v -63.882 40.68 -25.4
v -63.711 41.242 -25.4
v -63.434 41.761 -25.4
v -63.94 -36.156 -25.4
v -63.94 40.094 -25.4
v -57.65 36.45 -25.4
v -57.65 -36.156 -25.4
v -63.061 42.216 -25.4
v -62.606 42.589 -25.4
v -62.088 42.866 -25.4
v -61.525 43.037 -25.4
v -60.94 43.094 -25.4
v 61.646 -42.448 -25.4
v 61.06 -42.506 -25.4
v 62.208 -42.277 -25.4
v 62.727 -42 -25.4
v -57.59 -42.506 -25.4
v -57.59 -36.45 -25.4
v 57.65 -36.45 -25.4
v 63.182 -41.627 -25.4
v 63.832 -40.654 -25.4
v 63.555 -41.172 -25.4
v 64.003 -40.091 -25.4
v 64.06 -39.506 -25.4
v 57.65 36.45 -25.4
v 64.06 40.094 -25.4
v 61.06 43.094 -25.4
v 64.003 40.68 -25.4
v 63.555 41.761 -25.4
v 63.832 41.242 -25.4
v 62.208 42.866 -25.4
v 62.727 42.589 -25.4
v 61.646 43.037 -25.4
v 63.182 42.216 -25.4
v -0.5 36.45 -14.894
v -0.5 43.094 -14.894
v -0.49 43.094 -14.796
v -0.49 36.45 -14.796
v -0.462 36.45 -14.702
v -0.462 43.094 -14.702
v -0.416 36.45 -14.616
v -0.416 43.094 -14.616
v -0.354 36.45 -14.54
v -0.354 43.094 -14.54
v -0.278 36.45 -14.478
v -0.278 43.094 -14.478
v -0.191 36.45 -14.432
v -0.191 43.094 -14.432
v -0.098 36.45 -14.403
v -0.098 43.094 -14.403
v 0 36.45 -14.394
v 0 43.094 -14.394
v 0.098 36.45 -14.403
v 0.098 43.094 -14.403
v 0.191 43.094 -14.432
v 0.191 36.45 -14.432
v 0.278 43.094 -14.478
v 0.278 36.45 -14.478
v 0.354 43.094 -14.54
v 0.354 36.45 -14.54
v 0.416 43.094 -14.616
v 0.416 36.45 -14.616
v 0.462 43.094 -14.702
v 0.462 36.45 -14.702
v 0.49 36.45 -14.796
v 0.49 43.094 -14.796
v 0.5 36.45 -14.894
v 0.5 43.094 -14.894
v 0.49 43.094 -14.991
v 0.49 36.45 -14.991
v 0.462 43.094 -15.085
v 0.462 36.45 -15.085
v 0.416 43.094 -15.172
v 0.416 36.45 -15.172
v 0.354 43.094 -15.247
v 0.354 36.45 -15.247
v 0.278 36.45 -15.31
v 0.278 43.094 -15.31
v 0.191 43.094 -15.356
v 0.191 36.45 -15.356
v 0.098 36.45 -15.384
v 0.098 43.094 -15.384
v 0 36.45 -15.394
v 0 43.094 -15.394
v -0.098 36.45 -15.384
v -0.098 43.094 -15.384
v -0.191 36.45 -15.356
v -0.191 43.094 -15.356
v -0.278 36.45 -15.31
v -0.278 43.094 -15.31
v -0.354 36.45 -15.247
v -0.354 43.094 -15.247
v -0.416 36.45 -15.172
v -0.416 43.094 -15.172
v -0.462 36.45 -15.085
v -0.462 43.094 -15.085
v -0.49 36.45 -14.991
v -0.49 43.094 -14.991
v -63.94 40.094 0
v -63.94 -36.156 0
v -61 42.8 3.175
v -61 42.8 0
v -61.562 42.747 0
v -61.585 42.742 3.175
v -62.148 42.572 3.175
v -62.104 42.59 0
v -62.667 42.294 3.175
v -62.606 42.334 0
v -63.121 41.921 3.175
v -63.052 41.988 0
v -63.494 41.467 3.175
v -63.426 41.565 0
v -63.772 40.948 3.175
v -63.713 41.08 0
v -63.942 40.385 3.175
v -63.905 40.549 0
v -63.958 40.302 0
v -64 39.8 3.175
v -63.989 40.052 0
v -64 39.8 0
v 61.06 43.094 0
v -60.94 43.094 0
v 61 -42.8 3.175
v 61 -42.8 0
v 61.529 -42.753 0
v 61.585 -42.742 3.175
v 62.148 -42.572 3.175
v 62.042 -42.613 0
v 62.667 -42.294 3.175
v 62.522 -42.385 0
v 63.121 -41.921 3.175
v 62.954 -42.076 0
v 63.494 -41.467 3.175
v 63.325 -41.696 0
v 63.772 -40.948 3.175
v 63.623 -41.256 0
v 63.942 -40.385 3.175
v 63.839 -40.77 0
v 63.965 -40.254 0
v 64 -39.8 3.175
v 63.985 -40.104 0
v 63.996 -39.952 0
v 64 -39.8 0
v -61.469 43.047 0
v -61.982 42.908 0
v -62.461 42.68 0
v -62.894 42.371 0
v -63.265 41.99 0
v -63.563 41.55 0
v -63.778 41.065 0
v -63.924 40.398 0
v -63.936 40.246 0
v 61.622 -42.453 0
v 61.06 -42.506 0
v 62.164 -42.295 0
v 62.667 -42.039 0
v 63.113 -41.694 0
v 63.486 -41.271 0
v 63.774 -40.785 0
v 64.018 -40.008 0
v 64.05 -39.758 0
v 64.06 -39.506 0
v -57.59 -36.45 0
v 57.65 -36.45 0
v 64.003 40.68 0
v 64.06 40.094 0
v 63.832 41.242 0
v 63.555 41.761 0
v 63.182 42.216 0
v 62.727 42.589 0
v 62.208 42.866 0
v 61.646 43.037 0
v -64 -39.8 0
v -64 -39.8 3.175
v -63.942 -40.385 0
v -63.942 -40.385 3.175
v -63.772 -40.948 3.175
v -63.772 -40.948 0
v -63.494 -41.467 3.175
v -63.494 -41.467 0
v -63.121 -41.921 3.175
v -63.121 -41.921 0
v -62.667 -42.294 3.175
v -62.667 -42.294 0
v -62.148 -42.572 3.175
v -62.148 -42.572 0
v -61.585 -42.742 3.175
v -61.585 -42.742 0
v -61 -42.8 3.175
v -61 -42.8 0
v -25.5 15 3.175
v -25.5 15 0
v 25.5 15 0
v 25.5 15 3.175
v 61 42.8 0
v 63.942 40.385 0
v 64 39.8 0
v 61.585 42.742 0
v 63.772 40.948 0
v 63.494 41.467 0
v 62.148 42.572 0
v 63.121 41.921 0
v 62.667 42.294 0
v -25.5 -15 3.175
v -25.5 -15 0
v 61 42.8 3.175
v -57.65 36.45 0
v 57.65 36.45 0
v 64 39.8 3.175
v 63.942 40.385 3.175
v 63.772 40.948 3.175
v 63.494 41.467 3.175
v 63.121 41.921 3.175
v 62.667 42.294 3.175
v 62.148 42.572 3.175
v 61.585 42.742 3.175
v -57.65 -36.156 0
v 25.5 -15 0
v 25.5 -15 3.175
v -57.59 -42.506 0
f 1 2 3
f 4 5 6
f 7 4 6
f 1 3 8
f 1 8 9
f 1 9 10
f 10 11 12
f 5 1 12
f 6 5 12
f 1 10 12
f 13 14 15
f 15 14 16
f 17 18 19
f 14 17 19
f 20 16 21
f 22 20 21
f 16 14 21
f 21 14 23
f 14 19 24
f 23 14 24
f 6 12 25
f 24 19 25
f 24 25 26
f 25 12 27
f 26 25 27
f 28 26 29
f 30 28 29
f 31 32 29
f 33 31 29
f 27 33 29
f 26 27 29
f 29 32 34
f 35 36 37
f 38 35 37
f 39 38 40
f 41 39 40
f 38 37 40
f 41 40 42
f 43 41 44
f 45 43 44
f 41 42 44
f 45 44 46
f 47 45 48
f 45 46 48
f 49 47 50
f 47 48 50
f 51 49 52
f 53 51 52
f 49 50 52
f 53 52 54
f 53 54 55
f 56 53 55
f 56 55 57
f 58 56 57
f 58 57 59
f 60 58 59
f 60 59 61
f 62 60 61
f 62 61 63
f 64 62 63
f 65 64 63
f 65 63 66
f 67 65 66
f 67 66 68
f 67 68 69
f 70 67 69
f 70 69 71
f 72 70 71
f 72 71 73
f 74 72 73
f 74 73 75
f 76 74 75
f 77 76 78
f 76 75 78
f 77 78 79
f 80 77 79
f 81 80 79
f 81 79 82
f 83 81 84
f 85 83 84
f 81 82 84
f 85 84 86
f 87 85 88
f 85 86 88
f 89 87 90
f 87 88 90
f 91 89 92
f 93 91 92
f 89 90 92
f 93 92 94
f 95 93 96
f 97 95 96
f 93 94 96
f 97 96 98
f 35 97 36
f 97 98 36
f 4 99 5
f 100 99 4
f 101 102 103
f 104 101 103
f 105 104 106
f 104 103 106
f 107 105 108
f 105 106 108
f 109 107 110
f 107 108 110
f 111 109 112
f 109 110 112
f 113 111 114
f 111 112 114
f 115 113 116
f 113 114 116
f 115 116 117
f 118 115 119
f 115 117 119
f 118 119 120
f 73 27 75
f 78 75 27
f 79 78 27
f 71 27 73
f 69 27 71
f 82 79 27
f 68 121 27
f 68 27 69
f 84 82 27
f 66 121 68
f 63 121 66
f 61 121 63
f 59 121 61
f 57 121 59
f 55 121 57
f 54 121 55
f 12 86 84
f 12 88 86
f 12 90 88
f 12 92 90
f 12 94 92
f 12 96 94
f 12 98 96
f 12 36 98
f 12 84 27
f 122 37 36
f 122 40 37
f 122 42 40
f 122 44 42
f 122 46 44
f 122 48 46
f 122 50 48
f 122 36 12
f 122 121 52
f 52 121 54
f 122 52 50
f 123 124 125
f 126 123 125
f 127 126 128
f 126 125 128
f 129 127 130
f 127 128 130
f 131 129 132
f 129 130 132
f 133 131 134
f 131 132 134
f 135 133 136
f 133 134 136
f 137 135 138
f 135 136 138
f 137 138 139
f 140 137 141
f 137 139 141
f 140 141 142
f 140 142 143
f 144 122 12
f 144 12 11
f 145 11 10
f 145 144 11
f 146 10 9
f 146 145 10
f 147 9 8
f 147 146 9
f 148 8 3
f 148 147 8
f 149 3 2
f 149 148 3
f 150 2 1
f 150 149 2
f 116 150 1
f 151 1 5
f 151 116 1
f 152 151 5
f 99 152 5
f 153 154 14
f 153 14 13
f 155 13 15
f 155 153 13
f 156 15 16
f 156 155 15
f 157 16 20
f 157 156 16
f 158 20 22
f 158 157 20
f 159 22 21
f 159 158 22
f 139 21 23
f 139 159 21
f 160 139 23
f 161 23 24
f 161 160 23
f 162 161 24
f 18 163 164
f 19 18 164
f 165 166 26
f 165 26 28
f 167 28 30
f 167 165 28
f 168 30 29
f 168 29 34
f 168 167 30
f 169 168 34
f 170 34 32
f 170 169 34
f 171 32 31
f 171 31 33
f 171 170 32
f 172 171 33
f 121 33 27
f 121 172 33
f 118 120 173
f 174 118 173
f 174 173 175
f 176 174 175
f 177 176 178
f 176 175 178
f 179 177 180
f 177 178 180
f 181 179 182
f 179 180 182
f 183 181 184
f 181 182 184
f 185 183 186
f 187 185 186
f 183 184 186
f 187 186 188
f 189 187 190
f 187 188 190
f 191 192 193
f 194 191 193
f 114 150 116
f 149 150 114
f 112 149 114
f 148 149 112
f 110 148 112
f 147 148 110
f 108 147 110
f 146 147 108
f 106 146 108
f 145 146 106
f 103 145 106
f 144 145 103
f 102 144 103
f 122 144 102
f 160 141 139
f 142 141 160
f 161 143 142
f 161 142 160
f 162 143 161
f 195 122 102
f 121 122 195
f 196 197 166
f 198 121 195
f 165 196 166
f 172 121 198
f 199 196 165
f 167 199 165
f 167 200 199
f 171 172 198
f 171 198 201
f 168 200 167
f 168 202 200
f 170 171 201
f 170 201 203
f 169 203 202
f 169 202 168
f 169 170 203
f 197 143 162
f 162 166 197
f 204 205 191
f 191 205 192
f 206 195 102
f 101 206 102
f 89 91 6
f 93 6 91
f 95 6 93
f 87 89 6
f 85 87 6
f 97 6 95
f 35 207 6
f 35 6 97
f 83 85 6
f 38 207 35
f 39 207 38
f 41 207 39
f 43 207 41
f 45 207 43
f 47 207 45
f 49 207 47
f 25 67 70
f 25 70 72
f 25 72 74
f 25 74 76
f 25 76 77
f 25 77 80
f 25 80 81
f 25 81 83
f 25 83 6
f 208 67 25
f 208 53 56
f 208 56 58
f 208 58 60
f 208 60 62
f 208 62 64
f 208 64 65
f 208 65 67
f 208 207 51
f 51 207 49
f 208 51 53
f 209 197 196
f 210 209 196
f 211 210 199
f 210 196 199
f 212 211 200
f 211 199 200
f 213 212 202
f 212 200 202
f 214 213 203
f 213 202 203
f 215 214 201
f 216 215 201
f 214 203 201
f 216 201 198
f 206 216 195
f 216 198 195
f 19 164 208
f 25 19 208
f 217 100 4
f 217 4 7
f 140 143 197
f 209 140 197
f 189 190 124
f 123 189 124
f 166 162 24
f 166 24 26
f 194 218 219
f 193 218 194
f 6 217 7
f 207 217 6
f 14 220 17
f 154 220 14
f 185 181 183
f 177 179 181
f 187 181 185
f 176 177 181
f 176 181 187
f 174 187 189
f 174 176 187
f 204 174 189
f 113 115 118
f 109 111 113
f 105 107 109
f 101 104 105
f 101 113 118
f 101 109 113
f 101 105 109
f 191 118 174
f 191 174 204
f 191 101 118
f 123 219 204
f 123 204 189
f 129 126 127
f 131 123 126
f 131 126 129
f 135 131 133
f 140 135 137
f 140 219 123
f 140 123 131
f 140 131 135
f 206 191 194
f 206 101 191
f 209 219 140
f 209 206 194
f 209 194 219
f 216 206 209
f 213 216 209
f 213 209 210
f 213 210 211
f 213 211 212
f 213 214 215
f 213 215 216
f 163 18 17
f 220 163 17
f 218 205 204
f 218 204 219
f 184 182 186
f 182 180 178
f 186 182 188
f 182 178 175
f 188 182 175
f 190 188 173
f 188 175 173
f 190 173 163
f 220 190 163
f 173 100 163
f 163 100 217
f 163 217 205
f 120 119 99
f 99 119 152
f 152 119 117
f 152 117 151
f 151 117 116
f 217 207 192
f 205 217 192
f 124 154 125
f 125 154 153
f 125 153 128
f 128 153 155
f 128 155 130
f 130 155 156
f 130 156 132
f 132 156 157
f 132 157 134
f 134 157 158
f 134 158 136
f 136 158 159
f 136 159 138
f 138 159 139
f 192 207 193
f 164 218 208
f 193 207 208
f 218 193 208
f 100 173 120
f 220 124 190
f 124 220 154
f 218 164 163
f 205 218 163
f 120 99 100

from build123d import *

# Parameters (mm, degrees)
F0_W     = 51
F0_H     = 30
F1_DEPTH = 3.175
F2_W     = 115.3
F2_H     = 72.9
F4_DEPTH = 25.4
F3_W     = 115.3
F3_H     = 72.9
F5_DEPTH = 25.4
F6_R     = 0.5
F7_DEPTH = 25


with BuildPart() as f1:
    # F0 (on Top) → F1 (new body)
    with BuildSketch(Plane.XY):
        with BuildLine():
            Line((61, 42.8), (-61, 42.8))
            ThreePointArc((-61, 42.8), (-63.1213203436, 41.9213203436), (-64, 39.8))
            Line((-64, 39.8), (-64, -39.8))
            ThreePointArc((-64, -39.8), (-63.1213203436, -41.9213203436), (-61, -42.8))
            Line((-61, -42.8), (61, -42.8))
            ThreePointArc((61, -42.8), (63.1213203436, -41.9213203436), (64, -39.8))
            Line((64, -39.8), (64, 39.8))
            ThreePointArc((64, 39.8), (63.1213203436, 41.9213203436), (61, 42.8))
        make_face()
        Rectangle(F0_W, F0_H, mode=Mode.SUBTRACT)
    extrude(amount=F1_DEPTH)

    # F2 (on Top) → F4 (join)
    with BuildSketch(Plane.XY):
        with BuildLine():
            Line((-63.9396576047, -36.1556038049), (-57.5896576047, -36.1556038049))
            Line((-57.5896576047, -36.1556038049), (-57.5896576047, -42.5056038049))
            Line((-57.5896576047, -42.5056038049), (61.0603423953, -42.5056038049))
            ThreePointArc((61.0603423953, -42.5056038049), (63.1816627389, -41.6269241484), (64.0603423953, -39.5056038049))
            Line((64.0603423953, -39.5056038049), (64.0603423953, -36.1556038049))
            Line((64.0603423953, -36.1556038049), (64.0603423953, 36.7443961951))
            Line((64.0603423953, 36.7443961951), (64.0603423953, 40.0943961951))
            ThreePointArc((64.0603423953, 40.0943961951), (63.1816627389, 42.2157165387), (61.0603423953, 43.0943961951))
            Line((61.0603423953, 43.0943961951), (-57.5896576047, 43.0943961951))
            Line((-57.5896576047, 43.0943961951), (-60.9396576047, 43.0943961951))
            ThreePointArc((-60.9396576047, 43.0943961951), (-63.0609779483, 42.2157165387), (-63.9396576047, 40.0943961951))
            Line((-63.9396576047, 40.0943961951), (-63.9396576047, -36.1556038049))
        make_face()
        with Locations((0.0603423953, 0.2943961951)):
            Rectangle(F2_W, F2_H, mode=Mode.SUBTRACT)
        with Locations((0.0603423953, 0.2943961951)):
            Rectangle(F2_W, F2_H)
    extrude(amount=-F4_DEPTH)

    # F3 (on Top) → F5 (cut)
    with BuildSketch(Plane.XY):
        Rectangle(F3_W, F3_H)
    extrude(amount=-F5_DEPTH, mode=Mode.SUBTRACT)

    # F6 (on face) → F7 (cut)
    with BuildSketch(Plane(origin=(0, 43.0943961951, 0), x_dir=(-1, 0, 0), z_dir=(0, 1, 0))):
        with Locations((0, -14.8937767372)):
            Circle(F6_R)
    extrude(amount=-F7_DEPTH, mode=Mode.SUBTRACT)


solid = f1.part
